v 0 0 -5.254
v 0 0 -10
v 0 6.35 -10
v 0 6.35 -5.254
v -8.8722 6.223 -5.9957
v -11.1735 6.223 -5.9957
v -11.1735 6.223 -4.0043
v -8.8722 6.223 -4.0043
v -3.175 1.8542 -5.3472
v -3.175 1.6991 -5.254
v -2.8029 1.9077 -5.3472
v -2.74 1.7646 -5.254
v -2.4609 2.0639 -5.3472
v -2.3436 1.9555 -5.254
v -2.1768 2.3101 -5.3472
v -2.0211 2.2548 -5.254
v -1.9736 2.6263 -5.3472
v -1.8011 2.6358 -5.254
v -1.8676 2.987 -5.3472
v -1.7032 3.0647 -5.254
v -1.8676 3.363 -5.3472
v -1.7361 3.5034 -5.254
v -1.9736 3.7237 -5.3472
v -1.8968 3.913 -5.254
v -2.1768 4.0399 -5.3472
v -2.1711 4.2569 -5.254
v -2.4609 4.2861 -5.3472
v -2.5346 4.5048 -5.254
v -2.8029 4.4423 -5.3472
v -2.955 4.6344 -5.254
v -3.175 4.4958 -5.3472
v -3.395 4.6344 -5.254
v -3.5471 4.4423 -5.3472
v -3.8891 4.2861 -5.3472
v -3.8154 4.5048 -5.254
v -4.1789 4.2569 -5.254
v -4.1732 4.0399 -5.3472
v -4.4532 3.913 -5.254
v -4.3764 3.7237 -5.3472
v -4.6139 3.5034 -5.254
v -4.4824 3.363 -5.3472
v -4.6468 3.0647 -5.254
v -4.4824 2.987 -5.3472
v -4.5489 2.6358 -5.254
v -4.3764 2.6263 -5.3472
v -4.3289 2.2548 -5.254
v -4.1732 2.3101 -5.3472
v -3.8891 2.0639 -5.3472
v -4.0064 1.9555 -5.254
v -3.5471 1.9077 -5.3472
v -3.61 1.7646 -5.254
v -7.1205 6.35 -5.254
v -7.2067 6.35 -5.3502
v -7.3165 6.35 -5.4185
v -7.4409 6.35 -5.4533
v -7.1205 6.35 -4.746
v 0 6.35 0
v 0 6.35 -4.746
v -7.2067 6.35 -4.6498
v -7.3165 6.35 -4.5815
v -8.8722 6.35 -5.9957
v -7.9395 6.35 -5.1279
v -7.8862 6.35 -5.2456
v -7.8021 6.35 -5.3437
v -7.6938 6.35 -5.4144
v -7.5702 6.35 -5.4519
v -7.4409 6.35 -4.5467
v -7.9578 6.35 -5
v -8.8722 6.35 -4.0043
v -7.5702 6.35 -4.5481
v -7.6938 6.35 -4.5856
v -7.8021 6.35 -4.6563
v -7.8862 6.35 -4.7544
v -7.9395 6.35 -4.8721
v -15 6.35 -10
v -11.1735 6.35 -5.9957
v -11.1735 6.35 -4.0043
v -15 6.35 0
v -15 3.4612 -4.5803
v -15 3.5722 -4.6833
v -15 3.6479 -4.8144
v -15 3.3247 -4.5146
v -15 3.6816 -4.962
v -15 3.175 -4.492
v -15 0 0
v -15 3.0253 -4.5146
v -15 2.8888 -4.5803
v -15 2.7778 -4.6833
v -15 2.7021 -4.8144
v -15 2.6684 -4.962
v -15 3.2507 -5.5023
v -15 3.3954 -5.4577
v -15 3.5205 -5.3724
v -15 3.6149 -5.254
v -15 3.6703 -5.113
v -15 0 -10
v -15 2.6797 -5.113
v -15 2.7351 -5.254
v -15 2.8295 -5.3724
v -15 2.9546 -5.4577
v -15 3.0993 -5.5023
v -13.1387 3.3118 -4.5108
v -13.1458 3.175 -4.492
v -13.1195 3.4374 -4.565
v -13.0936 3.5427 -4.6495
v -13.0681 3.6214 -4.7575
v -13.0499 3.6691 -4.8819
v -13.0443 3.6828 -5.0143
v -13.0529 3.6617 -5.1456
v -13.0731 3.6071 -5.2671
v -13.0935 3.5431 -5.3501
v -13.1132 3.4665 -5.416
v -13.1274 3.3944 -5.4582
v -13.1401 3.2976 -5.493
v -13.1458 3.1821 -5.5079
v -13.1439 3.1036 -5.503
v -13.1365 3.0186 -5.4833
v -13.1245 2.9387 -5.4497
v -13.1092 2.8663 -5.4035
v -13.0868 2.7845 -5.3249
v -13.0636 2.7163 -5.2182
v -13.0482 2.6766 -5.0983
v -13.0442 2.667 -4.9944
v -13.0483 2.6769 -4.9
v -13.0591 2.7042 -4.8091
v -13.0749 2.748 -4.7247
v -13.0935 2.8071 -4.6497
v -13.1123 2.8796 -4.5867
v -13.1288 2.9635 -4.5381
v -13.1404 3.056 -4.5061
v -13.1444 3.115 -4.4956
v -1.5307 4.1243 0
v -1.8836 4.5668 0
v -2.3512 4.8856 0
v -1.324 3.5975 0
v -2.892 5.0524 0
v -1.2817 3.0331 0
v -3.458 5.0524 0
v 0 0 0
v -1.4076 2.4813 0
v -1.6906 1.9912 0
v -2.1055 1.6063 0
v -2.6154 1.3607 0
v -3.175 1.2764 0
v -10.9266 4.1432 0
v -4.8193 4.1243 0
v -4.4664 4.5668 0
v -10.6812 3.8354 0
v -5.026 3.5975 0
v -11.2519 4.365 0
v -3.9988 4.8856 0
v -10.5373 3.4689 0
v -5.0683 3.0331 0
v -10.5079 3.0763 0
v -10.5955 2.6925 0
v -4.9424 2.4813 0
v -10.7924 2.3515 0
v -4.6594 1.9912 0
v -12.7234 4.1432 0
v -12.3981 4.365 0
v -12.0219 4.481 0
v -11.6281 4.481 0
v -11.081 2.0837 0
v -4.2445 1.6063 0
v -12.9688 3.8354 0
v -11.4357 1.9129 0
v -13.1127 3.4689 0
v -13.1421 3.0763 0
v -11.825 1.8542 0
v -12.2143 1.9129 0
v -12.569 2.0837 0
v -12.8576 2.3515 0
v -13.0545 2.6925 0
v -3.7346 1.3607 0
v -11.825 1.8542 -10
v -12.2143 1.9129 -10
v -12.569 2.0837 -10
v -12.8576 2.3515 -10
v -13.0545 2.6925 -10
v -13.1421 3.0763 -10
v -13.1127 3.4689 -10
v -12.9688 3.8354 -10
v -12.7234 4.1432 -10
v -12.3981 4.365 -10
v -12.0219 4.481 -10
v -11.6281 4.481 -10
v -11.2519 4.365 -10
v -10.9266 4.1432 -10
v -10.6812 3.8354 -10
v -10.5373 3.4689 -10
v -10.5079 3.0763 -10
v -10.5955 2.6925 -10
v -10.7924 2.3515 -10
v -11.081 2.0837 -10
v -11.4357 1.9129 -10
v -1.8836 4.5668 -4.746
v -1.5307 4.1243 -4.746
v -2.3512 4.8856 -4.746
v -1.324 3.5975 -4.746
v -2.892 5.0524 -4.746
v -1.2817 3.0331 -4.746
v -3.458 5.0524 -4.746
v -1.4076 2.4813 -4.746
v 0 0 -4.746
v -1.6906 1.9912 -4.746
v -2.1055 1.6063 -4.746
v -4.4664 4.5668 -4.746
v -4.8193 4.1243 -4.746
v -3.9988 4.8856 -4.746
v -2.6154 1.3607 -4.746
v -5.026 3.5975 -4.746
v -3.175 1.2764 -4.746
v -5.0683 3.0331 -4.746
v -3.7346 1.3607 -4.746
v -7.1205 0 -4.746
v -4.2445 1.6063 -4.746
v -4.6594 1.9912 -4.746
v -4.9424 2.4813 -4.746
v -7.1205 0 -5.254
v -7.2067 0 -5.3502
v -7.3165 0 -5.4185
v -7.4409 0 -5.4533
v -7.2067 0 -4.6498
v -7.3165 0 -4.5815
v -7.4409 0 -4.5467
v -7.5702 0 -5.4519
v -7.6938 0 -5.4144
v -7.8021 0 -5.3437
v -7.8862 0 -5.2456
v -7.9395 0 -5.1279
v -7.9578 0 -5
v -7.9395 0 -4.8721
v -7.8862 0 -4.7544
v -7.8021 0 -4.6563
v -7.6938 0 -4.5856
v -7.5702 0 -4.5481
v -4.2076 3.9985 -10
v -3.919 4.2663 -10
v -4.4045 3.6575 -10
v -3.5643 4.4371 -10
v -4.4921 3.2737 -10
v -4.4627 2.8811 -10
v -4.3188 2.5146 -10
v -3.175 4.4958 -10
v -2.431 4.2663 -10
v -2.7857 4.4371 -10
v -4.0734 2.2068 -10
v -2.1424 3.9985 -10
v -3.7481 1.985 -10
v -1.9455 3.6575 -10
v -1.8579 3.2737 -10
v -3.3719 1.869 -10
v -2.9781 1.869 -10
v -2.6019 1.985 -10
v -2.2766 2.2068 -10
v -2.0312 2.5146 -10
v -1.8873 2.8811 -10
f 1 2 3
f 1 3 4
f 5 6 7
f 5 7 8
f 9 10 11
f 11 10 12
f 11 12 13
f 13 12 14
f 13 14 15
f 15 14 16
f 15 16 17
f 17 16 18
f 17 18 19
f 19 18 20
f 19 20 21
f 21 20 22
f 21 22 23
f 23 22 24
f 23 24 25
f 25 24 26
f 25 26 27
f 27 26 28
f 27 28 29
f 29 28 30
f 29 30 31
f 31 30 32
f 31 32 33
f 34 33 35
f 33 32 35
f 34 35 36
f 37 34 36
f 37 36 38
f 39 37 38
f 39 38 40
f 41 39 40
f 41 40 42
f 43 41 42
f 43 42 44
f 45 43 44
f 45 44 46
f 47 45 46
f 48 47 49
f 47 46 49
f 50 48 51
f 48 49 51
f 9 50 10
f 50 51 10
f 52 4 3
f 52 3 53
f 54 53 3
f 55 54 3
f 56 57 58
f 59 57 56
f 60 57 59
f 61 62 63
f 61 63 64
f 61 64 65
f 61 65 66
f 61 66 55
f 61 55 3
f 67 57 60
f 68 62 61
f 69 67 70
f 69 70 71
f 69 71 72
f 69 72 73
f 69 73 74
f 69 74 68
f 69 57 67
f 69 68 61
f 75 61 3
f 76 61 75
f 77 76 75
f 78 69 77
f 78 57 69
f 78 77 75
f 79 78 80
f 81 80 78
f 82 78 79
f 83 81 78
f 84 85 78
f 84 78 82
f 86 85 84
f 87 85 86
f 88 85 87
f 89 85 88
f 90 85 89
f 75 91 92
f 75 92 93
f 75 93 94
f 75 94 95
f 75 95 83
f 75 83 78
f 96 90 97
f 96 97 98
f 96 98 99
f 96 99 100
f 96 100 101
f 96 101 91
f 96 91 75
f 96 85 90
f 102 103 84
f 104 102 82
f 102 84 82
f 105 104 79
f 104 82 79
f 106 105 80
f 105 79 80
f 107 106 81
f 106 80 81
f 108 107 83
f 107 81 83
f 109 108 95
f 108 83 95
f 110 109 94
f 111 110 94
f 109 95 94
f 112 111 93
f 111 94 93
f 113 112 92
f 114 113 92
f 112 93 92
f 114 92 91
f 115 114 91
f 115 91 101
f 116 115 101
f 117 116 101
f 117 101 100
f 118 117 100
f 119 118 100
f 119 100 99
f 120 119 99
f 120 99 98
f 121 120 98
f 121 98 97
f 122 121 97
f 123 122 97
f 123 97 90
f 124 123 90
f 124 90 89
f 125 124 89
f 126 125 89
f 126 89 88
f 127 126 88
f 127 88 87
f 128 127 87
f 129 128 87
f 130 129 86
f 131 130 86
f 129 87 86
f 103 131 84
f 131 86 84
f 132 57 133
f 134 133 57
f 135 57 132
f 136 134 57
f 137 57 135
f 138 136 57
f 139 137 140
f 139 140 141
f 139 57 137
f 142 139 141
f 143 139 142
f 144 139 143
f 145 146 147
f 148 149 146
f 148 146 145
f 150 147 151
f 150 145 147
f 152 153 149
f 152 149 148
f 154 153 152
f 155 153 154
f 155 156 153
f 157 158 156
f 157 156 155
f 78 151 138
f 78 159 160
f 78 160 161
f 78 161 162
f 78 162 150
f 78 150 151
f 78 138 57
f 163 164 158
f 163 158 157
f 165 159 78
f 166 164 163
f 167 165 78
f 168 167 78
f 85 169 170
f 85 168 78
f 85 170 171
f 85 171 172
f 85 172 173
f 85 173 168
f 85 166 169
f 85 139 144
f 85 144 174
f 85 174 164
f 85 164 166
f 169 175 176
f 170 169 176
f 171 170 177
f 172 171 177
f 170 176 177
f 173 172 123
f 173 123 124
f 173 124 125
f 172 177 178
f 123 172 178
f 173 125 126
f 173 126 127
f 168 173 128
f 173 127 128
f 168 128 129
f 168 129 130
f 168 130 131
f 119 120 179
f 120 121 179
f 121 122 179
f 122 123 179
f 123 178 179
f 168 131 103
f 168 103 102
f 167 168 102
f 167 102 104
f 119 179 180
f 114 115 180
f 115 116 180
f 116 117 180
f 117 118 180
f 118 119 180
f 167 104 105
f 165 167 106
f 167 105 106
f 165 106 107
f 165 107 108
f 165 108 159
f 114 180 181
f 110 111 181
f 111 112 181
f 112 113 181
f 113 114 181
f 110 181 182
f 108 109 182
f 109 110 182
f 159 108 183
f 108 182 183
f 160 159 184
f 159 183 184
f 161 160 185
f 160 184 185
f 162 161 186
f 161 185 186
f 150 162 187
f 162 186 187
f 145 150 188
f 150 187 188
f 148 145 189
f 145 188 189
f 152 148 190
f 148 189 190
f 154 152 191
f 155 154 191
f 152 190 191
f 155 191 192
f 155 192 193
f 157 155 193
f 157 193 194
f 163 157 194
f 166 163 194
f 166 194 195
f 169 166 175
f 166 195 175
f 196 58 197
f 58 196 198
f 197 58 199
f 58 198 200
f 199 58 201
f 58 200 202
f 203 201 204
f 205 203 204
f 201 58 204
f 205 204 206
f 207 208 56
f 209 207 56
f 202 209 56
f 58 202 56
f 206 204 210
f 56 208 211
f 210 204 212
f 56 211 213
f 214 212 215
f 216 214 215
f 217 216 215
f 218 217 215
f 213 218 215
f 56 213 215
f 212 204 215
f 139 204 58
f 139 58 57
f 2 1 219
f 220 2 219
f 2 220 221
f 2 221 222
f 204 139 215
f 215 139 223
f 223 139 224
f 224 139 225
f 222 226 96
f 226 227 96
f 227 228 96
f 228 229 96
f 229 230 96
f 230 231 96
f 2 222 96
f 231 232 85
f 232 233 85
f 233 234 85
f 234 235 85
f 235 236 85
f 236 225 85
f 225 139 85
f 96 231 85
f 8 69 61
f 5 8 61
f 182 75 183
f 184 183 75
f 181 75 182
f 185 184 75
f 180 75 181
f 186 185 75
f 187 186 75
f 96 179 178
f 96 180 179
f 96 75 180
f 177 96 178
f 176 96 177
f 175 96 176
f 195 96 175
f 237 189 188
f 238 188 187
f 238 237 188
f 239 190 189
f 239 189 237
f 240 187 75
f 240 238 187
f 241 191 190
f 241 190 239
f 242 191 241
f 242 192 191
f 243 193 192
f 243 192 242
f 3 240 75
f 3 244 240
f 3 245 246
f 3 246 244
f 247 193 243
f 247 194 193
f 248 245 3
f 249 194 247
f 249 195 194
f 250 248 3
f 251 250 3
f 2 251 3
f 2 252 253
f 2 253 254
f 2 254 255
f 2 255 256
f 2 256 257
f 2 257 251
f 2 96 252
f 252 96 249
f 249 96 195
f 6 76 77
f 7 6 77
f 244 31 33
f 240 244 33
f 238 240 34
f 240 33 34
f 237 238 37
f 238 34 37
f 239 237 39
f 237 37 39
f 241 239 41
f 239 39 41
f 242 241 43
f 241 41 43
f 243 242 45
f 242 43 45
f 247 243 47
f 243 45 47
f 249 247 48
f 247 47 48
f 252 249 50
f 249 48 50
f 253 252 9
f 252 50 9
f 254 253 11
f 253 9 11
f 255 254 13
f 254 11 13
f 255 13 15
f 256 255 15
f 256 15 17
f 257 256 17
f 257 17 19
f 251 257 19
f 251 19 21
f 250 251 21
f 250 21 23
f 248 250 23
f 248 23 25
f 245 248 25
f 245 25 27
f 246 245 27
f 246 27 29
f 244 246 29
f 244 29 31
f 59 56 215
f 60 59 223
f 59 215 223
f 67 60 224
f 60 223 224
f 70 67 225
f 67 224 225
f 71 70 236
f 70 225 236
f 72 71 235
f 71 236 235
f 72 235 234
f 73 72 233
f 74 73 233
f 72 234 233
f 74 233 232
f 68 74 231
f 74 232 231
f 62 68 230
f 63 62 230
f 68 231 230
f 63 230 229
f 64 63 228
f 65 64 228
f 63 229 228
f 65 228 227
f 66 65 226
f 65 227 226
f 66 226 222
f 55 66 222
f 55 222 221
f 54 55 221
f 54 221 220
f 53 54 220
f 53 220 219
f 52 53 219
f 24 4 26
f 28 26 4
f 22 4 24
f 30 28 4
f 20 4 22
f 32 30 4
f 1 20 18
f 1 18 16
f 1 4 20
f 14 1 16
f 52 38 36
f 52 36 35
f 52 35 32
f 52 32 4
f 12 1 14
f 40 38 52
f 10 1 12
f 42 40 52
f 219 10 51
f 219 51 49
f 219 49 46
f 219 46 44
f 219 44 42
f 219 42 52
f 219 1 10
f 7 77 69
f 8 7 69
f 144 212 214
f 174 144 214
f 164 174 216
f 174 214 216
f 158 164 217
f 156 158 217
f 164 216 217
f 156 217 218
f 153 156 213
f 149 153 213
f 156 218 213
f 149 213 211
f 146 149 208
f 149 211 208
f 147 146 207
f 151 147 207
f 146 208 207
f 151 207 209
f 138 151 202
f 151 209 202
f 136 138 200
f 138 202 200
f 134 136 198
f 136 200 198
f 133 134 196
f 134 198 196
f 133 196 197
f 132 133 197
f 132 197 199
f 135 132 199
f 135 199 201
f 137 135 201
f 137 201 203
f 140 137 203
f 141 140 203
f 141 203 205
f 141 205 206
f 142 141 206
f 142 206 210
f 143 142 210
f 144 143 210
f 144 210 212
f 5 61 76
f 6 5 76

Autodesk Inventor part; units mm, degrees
ref_plane "YZ Plane" through (0, 0, 0) normal (1, 0, 0) x (0, 1, 0)
ref_plane "XZ Plane" through (0, 0, 0) normal (0, 1, 0) x (-1, 0, 0)
ref_plane "XY Plane" through (0, 0, 0) normal (0, 0, 1) x (1, 0, 0)
sketch "Sketch1" plane through (0, 0, 0) normal (0, 1, 0) x (-1, 0, 0)
  line L0 (0, 0) -> (15, 0)
  line L1 (15, 0) -> (15, -10)
  line L2 (15, -10) -> (0, -10)
  line L3 (0, -10) -> (0, 0)
  line L4 (0, -5) -> (7.5006, -5)
  circle A0 centre (7.5006, -5) radius 0.4572
  line L5 (0, -5.254) -> (7.1205, -5.254)
  line L6 (0, -4.746) -> (7.1205, -4.746)
  dimension "d0" = 15
  dimension "d1" = 10
  dimension "d2" = 7.5006
  dimension "d3" = 0.9144
  dimension "d4" = 0.254
  dimension "d5" = 0.254
extrude "Extrusion1" add sketch "Sketch1" along normal blind 6.35 contours L0 L1 L2 L3 L5 A0 L6
sketch "Sketch2" plane through (-15, 0, 0) normal (0, 0, 1) x (1, 0, 0)
  line L0 (7.8795, 0) -> (15, 0) projected
  line L1 (15, 0) -> (8.65, 6.35)
  line L2 (15, 6.35) -> (7.8795, 6.35) projected
  line L3 (15, 0) -> (23.9803, 0) construction
  circle A0 centre (11.825, 3.175) radius 1.7526
  line L4 (15, 0) -> (0, 0) projected
  line L5 (0, 0) -> (6.35, 6.35)
  line L6 (7.0422, 6.35) -> (7.8795, 6.35) projected
  line L7 (0, 0) -> (8.9803, 0) construction
  circle A1 centre (3.175, 3.175) radius 1.7526
  dimension "d8" = 135
  dimension "d9" = 3.5052
  dimension "d10" = 45
  dimension "d11" = 3.5052
sketch "Sketch3" plane through (-15, 0, -10) normal (-1, 0, 0) x (0, 0, 1)
  line L0 (0, 6.35) -> (10, 6.35) projected
  line L1 (0, 6.35) -> (10, 0)
  circle A0 centre (5, 3.175) radius 0.508
  dimension "d30" = 1.016
extrude "Extrusion2" cut sketch "Sketch3" against normal blind 3.5001
hole "Hole3" at (-11.825, 3.175, 0) direction (0, 0, -1) diameter 2.6416 end through all thread size "6-32 UNC" class "2B" standard "ANSI Unified Screw Threads"
sketch "Sketch4" plane through (0, 0, -10) normal (0, 0, -1) x (-1, 0, 0)
  line L0 (0, 0) -> (6.35, 6.35)
  line L1 (7.1205, 6.35) -> (0, 6.35) projected
  line L2 (0, 0) -> (8.9803, 0) construction
  line L3 (6.35, 6.35) -> (3.175, 3.175)
  circle A0 centre (3.175, 3.175) radius 1.3208
  dimension "d44" = 45
  dimension "d45" = 2.6416
hole "Hole4" at (-3.175, 3.175, -10) direction (0, 0, 1) diameter 2.6416 depth 5 tip angle 118 thread size "6-32 UNC" class "2B" standard "ANSI Unified Screw Threads"
hole "Hole5" at (-3.175, 3.175, 0) direction (0, 0, -1) diameter 3.7973 depth 5 tip angle 118 clearance for "Flat Head Machine Screw (82)" size "#6" standard "Ansi Unified Screw Threads"
sketch "Sketch5" plane through (0, 6.35, 0) normal (0, 1, 0) x (1, 0, 0)
  arc A0 (-7.1205, 5.254) -> (-7.1205, 4.746) centre (-7.5006, 5) ccw projected
  circle A1 centre (-7.5006, 5) radius 3.81
  circle A2 centre (-7.5006, 5) radius 16.51
  line L0 (-15, 10) -> (-15, 0) projected
  line L1 (-15, 0) -> (-8.65, 0)
  line L2 (-8.65, 0) -> (-8.65, -6.35)
  line L3 (-8.65, -6.35) -> (-15, -6.35)
  line L4 (-15, -6.35) -> (-15, 0)
  line L5 (-15, 10) -> (-8.65, 10)
  line L6 (-8.65, 10) -> (-8.65, 16.35)
  line L7 (-8.65, 16.35) -> (-15, 16.35)
  line L8 (-15, 16.35) -> (-15, 10)
  circle A3 centre (-7.5006, 5) radius 18.4277
  line L9 (-11.825, -9.8552) -> (-14.6952, -9.8552)
  line L10 (-14.6952, -9.8552) -> (-14.6952, -6.35)
  line L11 (-11.825, -9.8552) -> (-8.9548, -9.8552)
  line L12 (-8.9548, -9.8552) -> (-8.9548, -6.35)
  point P0 (0, 0)
  dimension "d60" = 7.62
  dimension "d61" = 33.02
  dimension "d62" = 6.35
  dimension "d63" = 6.35
  dimension "d64" = 6.35
  dimension "d65" = 6.35
  dimension "d66" = 36.8554
  dimension "d68" = 2.8702
  dimension "d69" = 2.8702
sketch "Sketch6" plane through (0, 6.35, 0) normal (0, 1, 0) x (1, 0, 0)
  arc A0 (-7.1205, 5.254) -> (-7.1205, 4.746) centre (-7.5006, 5) ccw projected
  line L0 (-7.9578, 5) -> (-8.8722, 5)
  line L1 (-8.8722, 5) -> (-8.8722, 5.9957)
  line L2 (-8.8722, 5.9957) -> (-11.1735, 5.9957)
  line L3 (-11.1735, 5.9957) -> (-11.1735, 4.0043)
  line L4 (-11.1735, 4.0043) -> (-8.8722, 4.0043)
  line L5 (-8.8722, 4.0043) -> (-8.8722, 5.9957)
  line L6 (-11.1735, 5.9957) -> (-21.1734, 5.9957)
  point P0 (0, 0)
  dimension "d70" = 0.9144
  dimension "d79" = 0.9957
  dimension "d80" = 2.3012
  dimension "d81" = 1.9914
  dimension "d84" = 10
extrude "Extrusion4" cut sketch "Sketch6" against normal blind 0.127
properties part number "clamp(6-32)-th"
